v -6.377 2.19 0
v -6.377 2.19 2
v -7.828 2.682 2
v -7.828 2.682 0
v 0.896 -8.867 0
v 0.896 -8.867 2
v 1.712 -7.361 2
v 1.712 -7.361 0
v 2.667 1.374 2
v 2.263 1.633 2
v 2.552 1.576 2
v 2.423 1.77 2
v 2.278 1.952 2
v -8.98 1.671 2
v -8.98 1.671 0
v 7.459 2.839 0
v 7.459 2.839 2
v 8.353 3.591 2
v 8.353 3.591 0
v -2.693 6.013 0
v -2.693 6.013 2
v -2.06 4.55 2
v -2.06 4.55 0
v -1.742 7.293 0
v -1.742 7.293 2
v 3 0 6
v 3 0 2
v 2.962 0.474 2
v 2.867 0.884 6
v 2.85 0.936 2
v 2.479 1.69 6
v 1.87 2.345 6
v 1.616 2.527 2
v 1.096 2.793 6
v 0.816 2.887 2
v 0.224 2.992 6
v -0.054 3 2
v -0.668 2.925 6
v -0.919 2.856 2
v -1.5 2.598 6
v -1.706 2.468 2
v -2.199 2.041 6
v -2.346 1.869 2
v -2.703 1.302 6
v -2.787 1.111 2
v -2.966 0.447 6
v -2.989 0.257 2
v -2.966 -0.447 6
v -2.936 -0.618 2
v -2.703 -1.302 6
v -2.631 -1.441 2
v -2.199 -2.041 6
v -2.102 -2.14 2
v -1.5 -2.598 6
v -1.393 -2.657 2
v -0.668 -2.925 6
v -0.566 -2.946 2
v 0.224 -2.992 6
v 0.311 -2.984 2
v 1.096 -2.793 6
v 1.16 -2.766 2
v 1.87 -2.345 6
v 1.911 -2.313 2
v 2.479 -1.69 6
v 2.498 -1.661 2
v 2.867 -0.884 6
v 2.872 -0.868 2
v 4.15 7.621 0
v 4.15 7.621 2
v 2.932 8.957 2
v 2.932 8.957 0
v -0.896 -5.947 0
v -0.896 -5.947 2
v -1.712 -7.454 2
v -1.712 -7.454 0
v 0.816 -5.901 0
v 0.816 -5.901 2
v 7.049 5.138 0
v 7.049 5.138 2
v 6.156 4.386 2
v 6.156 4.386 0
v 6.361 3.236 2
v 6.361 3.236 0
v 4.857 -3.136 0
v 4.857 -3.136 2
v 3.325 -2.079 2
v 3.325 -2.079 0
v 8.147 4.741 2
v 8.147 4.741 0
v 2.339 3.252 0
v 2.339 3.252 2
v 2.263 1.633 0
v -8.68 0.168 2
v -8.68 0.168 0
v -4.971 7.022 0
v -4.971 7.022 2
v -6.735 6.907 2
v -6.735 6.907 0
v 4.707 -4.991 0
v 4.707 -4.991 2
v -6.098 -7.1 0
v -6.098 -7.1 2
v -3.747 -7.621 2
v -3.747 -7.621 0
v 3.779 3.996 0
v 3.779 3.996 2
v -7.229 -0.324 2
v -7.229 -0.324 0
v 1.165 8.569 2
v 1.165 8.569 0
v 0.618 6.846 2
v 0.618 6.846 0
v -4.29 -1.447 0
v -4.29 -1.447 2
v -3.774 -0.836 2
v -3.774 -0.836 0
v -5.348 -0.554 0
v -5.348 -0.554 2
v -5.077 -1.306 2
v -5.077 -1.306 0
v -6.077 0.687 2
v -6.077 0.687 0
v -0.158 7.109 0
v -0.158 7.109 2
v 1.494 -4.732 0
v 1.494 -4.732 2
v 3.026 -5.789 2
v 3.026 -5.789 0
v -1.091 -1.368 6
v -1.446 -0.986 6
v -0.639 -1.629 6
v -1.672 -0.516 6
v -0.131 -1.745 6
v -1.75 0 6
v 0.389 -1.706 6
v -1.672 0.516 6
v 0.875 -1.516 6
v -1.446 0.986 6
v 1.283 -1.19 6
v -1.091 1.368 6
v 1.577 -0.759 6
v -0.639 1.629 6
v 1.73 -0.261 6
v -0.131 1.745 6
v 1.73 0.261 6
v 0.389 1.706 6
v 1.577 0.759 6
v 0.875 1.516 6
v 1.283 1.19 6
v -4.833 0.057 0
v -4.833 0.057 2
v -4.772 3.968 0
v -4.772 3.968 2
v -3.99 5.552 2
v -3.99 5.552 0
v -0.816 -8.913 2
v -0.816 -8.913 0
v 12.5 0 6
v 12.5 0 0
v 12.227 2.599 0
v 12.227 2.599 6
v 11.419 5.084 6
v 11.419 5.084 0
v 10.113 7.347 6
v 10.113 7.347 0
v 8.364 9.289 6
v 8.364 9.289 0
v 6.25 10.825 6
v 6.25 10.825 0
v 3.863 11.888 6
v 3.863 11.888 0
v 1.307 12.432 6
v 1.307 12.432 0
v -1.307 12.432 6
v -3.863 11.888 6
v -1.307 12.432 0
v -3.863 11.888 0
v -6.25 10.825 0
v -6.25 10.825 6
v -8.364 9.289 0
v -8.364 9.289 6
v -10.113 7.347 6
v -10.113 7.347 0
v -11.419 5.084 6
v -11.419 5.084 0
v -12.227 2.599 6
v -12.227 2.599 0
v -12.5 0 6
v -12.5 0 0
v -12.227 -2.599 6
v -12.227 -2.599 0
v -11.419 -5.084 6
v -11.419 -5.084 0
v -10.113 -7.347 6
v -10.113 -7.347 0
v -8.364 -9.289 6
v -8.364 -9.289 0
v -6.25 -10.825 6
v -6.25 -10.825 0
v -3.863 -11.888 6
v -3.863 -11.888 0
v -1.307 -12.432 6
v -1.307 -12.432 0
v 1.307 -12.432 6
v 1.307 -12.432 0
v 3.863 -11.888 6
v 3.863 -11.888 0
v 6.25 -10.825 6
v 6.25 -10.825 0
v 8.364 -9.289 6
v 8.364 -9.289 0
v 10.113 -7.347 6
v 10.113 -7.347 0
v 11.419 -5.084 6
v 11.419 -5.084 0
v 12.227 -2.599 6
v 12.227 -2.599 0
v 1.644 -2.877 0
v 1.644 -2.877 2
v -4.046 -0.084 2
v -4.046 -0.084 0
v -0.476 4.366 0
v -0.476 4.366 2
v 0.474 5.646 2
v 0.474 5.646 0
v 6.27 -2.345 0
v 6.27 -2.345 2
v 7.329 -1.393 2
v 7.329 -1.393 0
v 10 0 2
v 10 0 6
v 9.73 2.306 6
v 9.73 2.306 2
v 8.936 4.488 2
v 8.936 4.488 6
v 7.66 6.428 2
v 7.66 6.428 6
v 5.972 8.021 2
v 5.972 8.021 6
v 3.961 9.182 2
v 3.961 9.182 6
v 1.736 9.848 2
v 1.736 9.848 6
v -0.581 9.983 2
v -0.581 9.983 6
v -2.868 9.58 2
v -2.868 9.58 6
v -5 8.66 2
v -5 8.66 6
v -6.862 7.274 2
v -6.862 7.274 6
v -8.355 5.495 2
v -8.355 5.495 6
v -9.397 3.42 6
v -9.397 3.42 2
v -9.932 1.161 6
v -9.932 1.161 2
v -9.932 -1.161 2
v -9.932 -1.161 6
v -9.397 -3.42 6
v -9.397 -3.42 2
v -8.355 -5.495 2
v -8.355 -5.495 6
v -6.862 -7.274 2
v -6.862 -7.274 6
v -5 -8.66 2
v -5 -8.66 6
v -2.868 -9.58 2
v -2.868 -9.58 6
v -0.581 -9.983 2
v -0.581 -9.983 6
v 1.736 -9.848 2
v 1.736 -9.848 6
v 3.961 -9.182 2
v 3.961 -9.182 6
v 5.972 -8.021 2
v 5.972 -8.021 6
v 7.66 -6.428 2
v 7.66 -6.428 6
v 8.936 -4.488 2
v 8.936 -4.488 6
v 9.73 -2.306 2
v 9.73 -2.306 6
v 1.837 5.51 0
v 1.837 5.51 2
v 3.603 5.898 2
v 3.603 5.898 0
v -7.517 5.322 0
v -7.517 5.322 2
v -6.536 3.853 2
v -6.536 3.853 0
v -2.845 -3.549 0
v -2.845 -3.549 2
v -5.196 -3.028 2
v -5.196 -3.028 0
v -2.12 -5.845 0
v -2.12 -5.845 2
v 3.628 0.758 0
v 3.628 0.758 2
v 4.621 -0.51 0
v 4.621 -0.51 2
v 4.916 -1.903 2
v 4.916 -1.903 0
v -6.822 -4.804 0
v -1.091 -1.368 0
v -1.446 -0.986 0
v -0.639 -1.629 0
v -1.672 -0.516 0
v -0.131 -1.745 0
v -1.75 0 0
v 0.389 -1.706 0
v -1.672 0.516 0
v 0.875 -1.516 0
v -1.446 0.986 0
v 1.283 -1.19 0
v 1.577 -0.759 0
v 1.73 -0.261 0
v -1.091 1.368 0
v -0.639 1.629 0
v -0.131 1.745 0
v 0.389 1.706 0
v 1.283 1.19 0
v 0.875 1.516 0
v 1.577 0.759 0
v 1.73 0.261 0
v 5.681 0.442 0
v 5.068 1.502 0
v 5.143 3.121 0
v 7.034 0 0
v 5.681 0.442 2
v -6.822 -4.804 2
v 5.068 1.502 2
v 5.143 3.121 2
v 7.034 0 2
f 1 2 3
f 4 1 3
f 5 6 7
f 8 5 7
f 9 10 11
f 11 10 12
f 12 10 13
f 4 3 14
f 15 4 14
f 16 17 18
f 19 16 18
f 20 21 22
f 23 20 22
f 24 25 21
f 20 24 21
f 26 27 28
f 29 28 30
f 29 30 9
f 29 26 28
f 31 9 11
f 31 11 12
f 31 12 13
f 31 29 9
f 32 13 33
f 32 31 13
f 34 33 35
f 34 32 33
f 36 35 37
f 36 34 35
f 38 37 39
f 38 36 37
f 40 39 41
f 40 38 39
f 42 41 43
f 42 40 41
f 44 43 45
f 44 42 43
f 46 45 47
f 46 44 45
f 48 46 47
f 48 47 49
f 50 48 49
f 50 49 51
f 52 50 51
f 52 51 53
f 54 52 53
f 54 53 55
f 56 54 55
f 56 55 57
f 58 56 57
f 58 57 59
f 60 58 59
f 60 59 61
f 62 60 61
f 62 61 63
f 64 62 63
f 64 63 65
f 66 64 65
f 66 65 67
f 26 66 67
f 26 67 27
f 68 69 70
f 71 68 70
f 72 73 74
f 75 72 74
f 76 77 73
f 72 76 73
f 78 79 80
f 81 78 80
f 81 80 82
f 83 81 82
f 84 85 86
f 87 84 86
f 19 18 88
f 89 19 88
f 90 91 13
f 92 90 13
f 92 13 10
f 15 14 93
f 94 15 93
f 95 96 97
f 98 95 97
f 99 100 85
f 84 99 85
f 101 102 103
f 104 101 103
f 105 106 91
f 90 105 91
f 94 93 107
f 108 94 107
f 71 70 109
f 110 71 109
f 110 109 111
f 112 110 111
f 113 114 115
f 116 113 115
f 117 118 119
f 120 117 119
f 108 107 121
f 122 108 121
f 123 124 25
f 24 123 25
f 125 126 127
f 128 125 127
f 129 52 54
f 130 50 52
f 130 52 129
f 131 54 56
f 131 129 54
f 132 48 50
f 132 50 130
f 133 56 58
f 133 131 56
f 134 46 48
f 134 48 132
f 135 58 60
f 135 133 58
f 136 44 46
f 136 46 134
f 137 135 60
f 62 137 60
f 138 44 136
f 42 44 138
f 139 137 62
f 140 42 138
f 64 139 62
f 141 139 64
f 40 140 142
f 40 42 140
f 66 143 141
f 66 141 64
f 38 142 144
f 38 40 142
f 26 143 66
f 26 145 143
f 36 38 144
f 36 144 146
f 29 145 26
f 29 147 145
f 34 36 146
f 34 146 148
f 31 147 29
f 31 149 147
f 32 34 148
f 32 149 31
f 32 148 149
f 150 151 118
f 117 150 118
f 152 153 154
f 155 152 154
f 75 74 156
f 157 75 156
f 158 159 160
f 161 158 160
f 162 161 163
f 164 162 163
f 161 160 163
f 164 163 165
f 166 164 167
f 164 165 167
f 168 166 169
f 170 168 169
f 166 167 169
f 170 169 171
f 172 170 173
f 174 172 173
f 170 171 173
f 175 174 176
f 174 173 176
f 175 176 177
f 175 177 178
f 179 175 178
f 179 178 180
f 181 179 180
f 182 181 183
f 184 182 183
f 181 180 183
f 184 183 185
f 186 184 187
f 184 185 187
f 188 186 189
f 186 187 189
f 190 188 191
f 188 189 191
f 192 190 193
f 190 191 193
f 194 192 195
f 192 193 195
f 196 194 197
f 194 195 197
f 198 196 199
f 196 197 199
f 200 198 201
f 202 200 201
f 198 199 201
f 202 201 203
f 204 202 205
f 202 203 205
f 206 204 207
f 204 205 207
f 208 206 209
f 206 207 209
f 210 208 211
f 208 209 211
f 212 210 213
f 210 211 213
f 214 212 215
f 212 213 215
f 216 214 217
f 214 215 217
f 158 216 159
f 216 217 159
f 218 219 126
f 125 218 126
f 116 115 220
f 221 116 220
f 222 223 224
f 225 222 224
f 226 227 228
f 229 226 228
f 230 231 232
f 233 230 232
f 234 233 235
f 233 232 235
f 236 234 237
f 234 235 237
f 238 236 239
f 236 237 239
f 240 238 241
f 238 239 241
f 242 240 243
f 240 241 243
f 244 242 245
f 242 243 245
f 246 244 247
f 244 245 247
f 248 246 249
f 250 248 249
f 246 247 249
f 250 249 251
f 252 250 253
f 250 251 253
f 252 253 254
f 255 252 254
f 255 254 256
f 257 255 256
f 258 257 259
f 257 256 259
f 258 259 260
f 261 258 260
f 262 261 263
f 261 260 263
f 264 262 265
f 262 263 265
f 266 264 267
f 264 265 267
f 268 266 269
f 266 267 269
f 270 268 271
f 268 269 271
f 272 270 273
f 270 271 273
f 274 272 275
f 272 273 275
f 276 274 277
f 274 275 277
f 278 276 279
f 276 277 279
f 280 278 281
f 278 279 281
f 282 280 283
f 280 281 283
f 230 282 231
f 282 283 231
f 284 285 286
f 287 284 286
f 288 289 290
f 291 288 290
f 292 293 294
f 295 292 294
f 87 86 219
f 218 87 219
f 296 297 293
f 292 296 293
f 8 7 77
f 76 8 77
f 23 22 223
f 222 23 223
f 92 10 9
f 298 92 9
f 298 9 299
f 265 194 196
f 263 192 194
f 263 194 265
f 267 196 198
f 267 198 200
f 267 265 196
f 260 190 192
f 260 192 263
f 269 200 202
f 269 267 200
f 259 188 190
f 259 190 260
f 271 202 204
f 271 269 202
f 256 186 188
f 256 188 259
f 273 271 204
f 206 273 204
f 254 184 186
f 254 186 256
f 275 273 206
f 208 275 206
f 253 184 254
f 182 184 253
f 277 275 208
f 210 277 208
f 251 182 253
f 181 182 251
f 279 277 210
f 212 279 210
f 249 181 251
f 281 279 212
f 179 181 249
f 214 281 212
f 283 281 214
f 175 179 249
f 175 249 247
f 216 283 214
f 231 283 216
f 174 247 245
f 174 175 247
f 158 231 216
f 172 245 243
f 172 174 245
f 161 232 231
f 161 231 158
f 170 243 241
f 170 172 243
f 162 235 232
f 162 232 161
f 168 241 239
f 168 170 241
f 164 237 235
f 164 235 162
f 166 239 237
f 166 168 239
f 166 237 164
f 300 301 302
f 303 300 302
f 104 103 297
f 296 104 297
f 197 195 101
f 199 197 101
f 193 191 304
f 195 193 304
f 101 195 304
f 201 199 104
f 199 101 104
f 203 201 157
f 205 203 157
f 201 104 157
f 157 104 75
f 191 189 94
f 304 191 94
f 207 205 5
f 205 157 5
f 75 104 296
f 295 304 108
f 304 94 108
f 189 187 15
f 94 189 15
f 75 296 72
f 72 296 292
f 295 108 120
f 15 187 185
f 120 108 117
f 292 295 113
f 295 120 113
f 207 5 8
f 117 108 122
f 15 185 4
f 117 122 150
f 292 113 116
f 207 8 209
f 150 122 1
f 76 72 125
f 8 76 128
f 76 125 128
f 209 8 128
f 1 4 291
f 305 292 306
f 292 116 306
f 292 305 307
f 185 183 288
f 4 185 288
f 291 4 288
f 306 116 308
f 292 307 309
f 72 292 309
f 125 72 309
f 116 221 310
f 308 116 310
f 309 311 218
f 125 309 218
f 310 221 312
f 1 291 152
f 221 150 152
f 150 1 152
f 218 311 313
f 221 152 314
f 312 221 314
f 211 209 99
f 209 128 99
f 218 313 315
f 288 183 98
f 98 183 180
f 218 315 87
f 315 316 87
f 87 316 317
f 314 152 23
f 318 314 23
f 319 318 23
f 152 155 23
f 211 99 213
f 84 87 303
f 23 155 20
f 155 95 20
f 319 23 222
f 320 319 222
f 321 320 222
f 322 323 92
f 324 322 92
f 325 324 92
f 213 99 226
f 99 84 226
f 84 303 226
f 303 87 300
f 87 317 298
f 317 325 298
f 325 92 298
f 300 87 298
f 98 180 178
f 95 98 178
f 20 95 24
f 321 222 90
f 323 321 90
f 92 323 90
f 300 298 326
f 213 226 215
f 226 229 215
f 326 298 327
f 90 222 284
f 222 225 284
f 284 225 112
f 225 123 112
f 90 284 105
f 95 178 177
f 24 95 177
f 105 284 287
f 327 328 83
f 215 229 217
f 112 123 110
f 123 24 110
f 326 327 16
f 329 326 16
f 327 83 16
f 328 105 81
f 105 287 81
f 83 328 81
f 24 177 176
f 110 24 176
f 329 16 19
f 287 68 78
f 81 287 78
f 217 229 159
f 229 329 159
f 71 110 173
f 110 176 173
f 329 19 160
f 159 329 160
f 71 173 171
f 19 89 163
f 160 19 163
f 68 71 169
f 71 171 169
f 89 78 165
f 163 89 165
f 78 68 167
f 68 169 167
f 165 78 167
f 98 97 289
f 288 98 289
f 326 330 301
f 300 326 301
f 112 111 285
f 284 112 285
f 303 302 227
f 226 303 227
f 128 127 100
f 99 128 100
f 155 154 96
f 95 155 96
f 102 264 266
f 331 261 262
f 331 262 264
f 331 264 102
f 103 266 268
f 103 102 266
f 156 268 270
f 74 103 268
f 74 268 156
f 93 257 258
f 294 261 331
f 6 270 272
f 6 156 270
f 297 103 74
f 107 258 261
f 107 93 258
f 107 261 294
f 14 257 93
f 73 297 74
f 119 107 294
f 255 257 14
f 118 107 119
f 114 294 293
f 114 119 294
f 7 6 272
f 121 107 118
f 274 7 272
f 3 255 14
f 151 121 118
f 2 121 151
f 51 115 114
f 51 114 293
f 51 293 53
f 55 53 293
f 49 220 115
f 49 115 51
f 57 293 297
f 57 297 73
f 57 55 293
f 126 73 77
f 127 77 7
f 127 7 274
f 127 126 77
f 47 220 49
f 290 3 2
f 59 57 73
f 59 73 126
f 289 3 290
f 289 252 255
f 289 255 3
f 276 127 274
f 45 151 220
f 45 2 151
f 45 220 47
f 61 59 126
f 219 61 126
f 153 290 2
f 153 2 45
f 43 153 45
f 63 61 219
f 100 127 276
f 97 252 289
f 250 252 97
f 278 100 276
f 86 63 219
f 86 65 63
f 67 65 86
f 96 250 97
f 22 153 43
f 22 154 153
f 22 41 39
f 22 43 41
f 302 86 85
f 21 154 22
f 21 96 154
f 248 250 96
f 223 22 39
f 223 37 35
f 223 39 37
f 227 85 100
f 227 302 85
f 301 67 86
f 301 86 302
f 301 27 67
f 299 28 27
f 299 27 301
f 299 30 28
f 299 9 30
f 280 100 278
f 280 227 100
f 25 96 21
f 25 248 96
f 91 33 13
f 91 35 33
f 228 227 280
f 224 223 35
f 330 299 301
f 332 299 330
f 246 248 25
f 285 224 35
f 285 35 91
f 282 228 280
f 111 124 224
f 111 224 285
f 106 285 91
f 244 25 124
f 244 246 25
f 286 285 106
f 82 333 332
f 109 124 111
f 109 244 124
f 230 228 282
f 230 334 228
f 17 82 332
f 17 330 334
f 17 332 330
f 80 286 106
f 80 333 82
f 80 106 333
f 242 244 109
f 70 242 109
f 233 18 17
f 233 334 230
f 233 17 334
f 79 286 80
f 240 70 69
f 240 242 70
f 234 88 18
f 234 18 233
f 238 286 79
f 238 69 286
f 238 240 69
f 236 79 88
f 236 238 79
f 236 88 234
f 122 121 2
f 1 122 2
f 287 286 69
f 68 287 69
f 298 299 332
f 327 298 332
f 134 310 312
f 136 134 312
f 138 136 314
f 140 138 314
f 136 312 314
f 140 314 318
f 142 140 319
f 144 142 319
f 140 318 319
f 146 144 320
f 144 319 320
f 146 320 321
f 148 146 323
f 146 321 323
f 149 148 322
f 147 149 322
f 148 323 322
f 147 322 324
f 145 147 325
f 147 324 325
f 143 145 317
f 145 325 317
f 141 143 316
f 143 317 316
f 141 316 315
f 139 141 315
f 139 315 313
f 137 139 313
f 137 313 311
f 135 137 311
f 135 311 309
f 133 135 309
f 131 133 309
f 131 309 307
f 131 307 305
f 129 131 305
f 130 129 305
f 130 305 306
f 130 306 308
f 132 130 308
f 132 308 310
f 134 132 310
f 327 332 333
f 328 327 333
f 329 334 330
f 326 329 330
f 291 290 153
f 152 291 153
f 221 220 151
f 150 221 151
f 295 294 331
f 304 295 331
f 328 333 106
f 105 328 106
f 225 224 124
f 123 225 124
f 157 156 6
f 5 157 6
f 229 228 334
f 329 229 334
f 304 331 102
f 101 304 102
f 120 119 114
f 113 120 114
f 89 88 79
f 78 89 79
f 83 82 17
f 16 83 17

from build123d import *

# Parameters (mm, degrees)
F0_R     = 12.5
F1_DEPTH = 6
F2_R     = 10
F2_R_2   = 3
F3_DEPTH = 4
F5_D     = 3.5
F7_DEPTH = 25
F8_DEPTH = 25
F9_DEPTH = 25


with BuildPart() as f1:
    # F0 (on Top) → F1 (new body)
    with BuildSketch(Plane.XY):
        Circle(F0_R)
    extrude(amount=F1_DEPTH)

    # F2 (on face) → F3 (cut)
    with BuildSketch(Plane.XY.offset(6)):
        Circle(F2_R)
        Circle(F2_R_2, mode=Mode.SUBTRACT)
    extrude(amount=-F3_DEPTH, mode=Mode.SUBTRACT)

    # F5 (through all)
    with Locations(Plane.XY.offset(6)):
        with Locations((0, 0)):
            Hole(F5_D / 2)

    # F6 (on face) → F7 (cut)
    with BuildSketch(Plane.XY.offset(2)):
        Polygon((-6.076968, 0.687006), (-6.376841, 2.190097), (-7.828492, 2.681945), (-8.980271, 1.670702), (-8.680398, 0.167611), (-7.228746, -0.324237), align=None)
        Polygon((-3.746789, -7.621035), (-2.120291, -5.845455), (-2.844739, -3.549077), (-5.195685, -3.028278), (-6.822183, -4.803858), (-6.097735, -7.100236), align=None)
        Polygon((-4.772137, 3.967759), (-3.990072, 5.552483), (-4.971451, 7.022133), (-6.734895, 6.907059), (-7.516959, 5.322335), (-6.53558, 3.852685), align=None)
        Polygon((-0.476487, 4.366405), (0.474315, 5.646003), (-0.158448, 7.109221), (-1.742013, 7.292841), (-2.692815, 6.013243), (-2.060052, 4.550025), align=None)
        Polygon((1.836744, 5.509974), (3.602874, 5.897518), (4.150317, 7.620804), (2.931629, 8.956546), (1.165498, 8.569002), (0.618056, 6.845716), align=None)
        Polygon((3.627879, 0.757783), (5.067878, 1.502148), (5.143239, 3.121406), (3.778601, 3.9963), (2.338601, 3.251935), (2.26324, 1.632677), align=None)
        Polygon((4.707175, -4.991184), (4.856818, -3.136321), (3.325281, -2.079295), (1.6441, -2.877132), (1.494457, -4.731995), (3.025994, -5.789022), align=None)
        Polygon((7.328884, -1.39316), (7.034425, 0), (5.680684, 0.441571), (4.621402, -0.510017), (4.91586, -1.903177), (6.269601, -2.344748), align=None)
        Polygon((-4.28992, -1.446621), (-3.774462, -0.835584), (-4.045906, -0.083666), (-4.832809, 0.057215), (-5.348267, -0.553822), (-5.076822, -1.30574), align=None)
        Polygon((0.89645, -8.866839), (1.712371, -7.360636), (0.815921, -5.900926), (-0.89645, -5.947419), (-1.712371, -7.453623), (-0.815921, -8.913333), align=None)
        Polygon((6.360979, 3.235691), (7.459494, 2.838528), (8.352706, 3.591288), (8.147402, 4.741212), (7.048886, 5.138376), (6.155675, 4.385615), align=None)
    extrude(amount=-F7_DEPTH, mode=Mode.SUBTRACT)

    # F6 (on face) → F8 (cut)
    with BuildSketch(Plane.XY.offset(2)):
        Polygon((-6.076968, 0.687006), (-6.376841, 2.190097), (-7.828492, 2.681945), (-8.980271, 1.670702), (-8.680398, 0.167611), (-7.228746, -0.324237), align=None)
        Polygon((-3.746789, -7.621035), (-2.120291, -5.845455), (-2.844739, -3.549077), (-5.195685, -3.028278), (-6.822183, -4.803858), (-6.097735, -7.100236), align=None)
        Polygon((-4.772137, 3.967759), (-3.990072, 5.552483), (-4.971451, 7.022133), (-6.734895, 6.907059), (-7.516959, 5.322335), (-6.53558, 3.852685), align=None)
        Polygon((-0.476487, 4.366405), (0.474315, 5.646003), (-0.158448, 7.109221), (-1.742013, 7.292841), (-2.692815, 6.013243), (-2.060052, 4.550025), align=None)
        Polygon((1.836744, 5.509974), (3.602874, 5.897518), (4.150317, 7.620804), (2.931629, 8.956546), (1.165498, 8.569002), (0.618056, 6.845716), align=None)
        Polygon((3.627879, 0.757783), (5.067878, 1.502148), (5.143239, 3.121406), (3.778601, 3.9963), (2.338601, 3.251935), (2.26324, 1.632677), align=None)
        Polygon((4.707175, -4.991184), (4.856818, -3.136321), (3.325281, -2.079295), (1.6441, -2.877132), (1.494457, -4.731995), (3.025994, -5.789022), align=None)
        Polygon((7.328884, -1.39316), (7.034425, 0), (5.680684, 0.441571), (4.621402, -0.510017), (4.91586, -1.903177), (6.269601, -2.344748), align=None)
        Polygon((-4.28992, -1.446621), (-3.774462, -0.835584), (-4.045906, -0.083666), (-4.832809, 0.057215), (-5.348267, -0.553822), (-5.076822, -1.30574), align=None)
        Polygon((0.89645, -8.866839), (1.712371, -7.360636), (0.815921, -5.900926), (-0.89645, -5.947419), (-1.712371, -7.453623), (-0.815921, -8.913333), align=None)
        Polygon((6.360979, 3.235691), (7.459494, 2.838528), (8.352706, 3.591288), (8.147402, 4.741212), (7.048886, 5.138376), (6.155675, 4.385615), align=None)
    extrude(amount=-F8_DEPTH, mode=Mode.SUBTRACT)

    # F6 (on face) → F9 (cut)
    with BuildSketch(Plane.XY.offset(2)):
        Polygon((-6.076968, 0.687006), (-6.376841, 2.190097), (-7.828492, 2.681945), (-8.980271, 1.670702), (-8.680398, 0.167611), (-7.228746, -0.324237), align=None)
        Polygon((-3.746789, -7.621035), (-2.120291, -5.845455), (-2.844739, -3.549077), (-5.195685, -3.028278), (-6.822183, -4.803858), (-6.097735, -7.100236), align=None)
        Polygon((-4.772137, 3.967759), (-3.990072, 5.552483), (-4.971451, 7.022133), (-6.734895, 6.907059), (-7.516959, 5.322335), (-6.53558, 3.852685), align=None)
        Polygon((-0.476487, 4.366405), (0.474315, 5.646003), (-0.158448, 7.109221), (-1.742013, 7.292841), (-2.692815, 6.013243), (-2.060052, 4.550025), align=None)
        Polygon((1.836744, 5.509974), (3.602874, 5.897518), (4.150317, 7.620804), (2.931629, 8.956546), (1.165498, 8.569002), (0.618056, 6.845716), align=None)
        Polygon((3.627879, 0.757783), (5.067878, 1.502148), (5.143239, 3.121406), (3.778601, 3.9963), (2.338601, 3.251935), (2.26324, 1.632677), align=None)
        Polygon((4.707175, -4.991184), (4.856818, -3.136321), (3.325281, -2.079295), (1.6441, -2.877132), (1.494457, -4.731995), (3.025994, -5.789022), align=None)
        Polygon((7.328884, -1.39316), (7.034425, 0), (5.680684, 0.441571), (4.621402, -0.510017), (4.91586, -1.903177), (6.269601, -2.344748), align=None)
        Polygon((-4.28992, -1.446621), (-3.774462, -0.835584), (-4.045906, -0.083666), (-4.832809, 0.057215), (-5.348267, -0.553822), (-5.076822, -1.30574), align=None)
        Polygon((0.89645, -8.866839), (1.712371, -7.360636), (0.815921, -5.900926), (-0.89645, -5.947419), (-1.712371, -7.453623), (-0.815921, -8.913333), align=None)
        Polygon((6.360979, 3.235691), (7.459494, 2.838528), (8.352706, 3.591288), (8.147402, 4.741212), (7.048886, 5.138376), (6.155675, 4.385615), align=None)
    extrude(amount=-F9_DEPTH, mode=Mode.SUBTRACT)


solid = f1.part
